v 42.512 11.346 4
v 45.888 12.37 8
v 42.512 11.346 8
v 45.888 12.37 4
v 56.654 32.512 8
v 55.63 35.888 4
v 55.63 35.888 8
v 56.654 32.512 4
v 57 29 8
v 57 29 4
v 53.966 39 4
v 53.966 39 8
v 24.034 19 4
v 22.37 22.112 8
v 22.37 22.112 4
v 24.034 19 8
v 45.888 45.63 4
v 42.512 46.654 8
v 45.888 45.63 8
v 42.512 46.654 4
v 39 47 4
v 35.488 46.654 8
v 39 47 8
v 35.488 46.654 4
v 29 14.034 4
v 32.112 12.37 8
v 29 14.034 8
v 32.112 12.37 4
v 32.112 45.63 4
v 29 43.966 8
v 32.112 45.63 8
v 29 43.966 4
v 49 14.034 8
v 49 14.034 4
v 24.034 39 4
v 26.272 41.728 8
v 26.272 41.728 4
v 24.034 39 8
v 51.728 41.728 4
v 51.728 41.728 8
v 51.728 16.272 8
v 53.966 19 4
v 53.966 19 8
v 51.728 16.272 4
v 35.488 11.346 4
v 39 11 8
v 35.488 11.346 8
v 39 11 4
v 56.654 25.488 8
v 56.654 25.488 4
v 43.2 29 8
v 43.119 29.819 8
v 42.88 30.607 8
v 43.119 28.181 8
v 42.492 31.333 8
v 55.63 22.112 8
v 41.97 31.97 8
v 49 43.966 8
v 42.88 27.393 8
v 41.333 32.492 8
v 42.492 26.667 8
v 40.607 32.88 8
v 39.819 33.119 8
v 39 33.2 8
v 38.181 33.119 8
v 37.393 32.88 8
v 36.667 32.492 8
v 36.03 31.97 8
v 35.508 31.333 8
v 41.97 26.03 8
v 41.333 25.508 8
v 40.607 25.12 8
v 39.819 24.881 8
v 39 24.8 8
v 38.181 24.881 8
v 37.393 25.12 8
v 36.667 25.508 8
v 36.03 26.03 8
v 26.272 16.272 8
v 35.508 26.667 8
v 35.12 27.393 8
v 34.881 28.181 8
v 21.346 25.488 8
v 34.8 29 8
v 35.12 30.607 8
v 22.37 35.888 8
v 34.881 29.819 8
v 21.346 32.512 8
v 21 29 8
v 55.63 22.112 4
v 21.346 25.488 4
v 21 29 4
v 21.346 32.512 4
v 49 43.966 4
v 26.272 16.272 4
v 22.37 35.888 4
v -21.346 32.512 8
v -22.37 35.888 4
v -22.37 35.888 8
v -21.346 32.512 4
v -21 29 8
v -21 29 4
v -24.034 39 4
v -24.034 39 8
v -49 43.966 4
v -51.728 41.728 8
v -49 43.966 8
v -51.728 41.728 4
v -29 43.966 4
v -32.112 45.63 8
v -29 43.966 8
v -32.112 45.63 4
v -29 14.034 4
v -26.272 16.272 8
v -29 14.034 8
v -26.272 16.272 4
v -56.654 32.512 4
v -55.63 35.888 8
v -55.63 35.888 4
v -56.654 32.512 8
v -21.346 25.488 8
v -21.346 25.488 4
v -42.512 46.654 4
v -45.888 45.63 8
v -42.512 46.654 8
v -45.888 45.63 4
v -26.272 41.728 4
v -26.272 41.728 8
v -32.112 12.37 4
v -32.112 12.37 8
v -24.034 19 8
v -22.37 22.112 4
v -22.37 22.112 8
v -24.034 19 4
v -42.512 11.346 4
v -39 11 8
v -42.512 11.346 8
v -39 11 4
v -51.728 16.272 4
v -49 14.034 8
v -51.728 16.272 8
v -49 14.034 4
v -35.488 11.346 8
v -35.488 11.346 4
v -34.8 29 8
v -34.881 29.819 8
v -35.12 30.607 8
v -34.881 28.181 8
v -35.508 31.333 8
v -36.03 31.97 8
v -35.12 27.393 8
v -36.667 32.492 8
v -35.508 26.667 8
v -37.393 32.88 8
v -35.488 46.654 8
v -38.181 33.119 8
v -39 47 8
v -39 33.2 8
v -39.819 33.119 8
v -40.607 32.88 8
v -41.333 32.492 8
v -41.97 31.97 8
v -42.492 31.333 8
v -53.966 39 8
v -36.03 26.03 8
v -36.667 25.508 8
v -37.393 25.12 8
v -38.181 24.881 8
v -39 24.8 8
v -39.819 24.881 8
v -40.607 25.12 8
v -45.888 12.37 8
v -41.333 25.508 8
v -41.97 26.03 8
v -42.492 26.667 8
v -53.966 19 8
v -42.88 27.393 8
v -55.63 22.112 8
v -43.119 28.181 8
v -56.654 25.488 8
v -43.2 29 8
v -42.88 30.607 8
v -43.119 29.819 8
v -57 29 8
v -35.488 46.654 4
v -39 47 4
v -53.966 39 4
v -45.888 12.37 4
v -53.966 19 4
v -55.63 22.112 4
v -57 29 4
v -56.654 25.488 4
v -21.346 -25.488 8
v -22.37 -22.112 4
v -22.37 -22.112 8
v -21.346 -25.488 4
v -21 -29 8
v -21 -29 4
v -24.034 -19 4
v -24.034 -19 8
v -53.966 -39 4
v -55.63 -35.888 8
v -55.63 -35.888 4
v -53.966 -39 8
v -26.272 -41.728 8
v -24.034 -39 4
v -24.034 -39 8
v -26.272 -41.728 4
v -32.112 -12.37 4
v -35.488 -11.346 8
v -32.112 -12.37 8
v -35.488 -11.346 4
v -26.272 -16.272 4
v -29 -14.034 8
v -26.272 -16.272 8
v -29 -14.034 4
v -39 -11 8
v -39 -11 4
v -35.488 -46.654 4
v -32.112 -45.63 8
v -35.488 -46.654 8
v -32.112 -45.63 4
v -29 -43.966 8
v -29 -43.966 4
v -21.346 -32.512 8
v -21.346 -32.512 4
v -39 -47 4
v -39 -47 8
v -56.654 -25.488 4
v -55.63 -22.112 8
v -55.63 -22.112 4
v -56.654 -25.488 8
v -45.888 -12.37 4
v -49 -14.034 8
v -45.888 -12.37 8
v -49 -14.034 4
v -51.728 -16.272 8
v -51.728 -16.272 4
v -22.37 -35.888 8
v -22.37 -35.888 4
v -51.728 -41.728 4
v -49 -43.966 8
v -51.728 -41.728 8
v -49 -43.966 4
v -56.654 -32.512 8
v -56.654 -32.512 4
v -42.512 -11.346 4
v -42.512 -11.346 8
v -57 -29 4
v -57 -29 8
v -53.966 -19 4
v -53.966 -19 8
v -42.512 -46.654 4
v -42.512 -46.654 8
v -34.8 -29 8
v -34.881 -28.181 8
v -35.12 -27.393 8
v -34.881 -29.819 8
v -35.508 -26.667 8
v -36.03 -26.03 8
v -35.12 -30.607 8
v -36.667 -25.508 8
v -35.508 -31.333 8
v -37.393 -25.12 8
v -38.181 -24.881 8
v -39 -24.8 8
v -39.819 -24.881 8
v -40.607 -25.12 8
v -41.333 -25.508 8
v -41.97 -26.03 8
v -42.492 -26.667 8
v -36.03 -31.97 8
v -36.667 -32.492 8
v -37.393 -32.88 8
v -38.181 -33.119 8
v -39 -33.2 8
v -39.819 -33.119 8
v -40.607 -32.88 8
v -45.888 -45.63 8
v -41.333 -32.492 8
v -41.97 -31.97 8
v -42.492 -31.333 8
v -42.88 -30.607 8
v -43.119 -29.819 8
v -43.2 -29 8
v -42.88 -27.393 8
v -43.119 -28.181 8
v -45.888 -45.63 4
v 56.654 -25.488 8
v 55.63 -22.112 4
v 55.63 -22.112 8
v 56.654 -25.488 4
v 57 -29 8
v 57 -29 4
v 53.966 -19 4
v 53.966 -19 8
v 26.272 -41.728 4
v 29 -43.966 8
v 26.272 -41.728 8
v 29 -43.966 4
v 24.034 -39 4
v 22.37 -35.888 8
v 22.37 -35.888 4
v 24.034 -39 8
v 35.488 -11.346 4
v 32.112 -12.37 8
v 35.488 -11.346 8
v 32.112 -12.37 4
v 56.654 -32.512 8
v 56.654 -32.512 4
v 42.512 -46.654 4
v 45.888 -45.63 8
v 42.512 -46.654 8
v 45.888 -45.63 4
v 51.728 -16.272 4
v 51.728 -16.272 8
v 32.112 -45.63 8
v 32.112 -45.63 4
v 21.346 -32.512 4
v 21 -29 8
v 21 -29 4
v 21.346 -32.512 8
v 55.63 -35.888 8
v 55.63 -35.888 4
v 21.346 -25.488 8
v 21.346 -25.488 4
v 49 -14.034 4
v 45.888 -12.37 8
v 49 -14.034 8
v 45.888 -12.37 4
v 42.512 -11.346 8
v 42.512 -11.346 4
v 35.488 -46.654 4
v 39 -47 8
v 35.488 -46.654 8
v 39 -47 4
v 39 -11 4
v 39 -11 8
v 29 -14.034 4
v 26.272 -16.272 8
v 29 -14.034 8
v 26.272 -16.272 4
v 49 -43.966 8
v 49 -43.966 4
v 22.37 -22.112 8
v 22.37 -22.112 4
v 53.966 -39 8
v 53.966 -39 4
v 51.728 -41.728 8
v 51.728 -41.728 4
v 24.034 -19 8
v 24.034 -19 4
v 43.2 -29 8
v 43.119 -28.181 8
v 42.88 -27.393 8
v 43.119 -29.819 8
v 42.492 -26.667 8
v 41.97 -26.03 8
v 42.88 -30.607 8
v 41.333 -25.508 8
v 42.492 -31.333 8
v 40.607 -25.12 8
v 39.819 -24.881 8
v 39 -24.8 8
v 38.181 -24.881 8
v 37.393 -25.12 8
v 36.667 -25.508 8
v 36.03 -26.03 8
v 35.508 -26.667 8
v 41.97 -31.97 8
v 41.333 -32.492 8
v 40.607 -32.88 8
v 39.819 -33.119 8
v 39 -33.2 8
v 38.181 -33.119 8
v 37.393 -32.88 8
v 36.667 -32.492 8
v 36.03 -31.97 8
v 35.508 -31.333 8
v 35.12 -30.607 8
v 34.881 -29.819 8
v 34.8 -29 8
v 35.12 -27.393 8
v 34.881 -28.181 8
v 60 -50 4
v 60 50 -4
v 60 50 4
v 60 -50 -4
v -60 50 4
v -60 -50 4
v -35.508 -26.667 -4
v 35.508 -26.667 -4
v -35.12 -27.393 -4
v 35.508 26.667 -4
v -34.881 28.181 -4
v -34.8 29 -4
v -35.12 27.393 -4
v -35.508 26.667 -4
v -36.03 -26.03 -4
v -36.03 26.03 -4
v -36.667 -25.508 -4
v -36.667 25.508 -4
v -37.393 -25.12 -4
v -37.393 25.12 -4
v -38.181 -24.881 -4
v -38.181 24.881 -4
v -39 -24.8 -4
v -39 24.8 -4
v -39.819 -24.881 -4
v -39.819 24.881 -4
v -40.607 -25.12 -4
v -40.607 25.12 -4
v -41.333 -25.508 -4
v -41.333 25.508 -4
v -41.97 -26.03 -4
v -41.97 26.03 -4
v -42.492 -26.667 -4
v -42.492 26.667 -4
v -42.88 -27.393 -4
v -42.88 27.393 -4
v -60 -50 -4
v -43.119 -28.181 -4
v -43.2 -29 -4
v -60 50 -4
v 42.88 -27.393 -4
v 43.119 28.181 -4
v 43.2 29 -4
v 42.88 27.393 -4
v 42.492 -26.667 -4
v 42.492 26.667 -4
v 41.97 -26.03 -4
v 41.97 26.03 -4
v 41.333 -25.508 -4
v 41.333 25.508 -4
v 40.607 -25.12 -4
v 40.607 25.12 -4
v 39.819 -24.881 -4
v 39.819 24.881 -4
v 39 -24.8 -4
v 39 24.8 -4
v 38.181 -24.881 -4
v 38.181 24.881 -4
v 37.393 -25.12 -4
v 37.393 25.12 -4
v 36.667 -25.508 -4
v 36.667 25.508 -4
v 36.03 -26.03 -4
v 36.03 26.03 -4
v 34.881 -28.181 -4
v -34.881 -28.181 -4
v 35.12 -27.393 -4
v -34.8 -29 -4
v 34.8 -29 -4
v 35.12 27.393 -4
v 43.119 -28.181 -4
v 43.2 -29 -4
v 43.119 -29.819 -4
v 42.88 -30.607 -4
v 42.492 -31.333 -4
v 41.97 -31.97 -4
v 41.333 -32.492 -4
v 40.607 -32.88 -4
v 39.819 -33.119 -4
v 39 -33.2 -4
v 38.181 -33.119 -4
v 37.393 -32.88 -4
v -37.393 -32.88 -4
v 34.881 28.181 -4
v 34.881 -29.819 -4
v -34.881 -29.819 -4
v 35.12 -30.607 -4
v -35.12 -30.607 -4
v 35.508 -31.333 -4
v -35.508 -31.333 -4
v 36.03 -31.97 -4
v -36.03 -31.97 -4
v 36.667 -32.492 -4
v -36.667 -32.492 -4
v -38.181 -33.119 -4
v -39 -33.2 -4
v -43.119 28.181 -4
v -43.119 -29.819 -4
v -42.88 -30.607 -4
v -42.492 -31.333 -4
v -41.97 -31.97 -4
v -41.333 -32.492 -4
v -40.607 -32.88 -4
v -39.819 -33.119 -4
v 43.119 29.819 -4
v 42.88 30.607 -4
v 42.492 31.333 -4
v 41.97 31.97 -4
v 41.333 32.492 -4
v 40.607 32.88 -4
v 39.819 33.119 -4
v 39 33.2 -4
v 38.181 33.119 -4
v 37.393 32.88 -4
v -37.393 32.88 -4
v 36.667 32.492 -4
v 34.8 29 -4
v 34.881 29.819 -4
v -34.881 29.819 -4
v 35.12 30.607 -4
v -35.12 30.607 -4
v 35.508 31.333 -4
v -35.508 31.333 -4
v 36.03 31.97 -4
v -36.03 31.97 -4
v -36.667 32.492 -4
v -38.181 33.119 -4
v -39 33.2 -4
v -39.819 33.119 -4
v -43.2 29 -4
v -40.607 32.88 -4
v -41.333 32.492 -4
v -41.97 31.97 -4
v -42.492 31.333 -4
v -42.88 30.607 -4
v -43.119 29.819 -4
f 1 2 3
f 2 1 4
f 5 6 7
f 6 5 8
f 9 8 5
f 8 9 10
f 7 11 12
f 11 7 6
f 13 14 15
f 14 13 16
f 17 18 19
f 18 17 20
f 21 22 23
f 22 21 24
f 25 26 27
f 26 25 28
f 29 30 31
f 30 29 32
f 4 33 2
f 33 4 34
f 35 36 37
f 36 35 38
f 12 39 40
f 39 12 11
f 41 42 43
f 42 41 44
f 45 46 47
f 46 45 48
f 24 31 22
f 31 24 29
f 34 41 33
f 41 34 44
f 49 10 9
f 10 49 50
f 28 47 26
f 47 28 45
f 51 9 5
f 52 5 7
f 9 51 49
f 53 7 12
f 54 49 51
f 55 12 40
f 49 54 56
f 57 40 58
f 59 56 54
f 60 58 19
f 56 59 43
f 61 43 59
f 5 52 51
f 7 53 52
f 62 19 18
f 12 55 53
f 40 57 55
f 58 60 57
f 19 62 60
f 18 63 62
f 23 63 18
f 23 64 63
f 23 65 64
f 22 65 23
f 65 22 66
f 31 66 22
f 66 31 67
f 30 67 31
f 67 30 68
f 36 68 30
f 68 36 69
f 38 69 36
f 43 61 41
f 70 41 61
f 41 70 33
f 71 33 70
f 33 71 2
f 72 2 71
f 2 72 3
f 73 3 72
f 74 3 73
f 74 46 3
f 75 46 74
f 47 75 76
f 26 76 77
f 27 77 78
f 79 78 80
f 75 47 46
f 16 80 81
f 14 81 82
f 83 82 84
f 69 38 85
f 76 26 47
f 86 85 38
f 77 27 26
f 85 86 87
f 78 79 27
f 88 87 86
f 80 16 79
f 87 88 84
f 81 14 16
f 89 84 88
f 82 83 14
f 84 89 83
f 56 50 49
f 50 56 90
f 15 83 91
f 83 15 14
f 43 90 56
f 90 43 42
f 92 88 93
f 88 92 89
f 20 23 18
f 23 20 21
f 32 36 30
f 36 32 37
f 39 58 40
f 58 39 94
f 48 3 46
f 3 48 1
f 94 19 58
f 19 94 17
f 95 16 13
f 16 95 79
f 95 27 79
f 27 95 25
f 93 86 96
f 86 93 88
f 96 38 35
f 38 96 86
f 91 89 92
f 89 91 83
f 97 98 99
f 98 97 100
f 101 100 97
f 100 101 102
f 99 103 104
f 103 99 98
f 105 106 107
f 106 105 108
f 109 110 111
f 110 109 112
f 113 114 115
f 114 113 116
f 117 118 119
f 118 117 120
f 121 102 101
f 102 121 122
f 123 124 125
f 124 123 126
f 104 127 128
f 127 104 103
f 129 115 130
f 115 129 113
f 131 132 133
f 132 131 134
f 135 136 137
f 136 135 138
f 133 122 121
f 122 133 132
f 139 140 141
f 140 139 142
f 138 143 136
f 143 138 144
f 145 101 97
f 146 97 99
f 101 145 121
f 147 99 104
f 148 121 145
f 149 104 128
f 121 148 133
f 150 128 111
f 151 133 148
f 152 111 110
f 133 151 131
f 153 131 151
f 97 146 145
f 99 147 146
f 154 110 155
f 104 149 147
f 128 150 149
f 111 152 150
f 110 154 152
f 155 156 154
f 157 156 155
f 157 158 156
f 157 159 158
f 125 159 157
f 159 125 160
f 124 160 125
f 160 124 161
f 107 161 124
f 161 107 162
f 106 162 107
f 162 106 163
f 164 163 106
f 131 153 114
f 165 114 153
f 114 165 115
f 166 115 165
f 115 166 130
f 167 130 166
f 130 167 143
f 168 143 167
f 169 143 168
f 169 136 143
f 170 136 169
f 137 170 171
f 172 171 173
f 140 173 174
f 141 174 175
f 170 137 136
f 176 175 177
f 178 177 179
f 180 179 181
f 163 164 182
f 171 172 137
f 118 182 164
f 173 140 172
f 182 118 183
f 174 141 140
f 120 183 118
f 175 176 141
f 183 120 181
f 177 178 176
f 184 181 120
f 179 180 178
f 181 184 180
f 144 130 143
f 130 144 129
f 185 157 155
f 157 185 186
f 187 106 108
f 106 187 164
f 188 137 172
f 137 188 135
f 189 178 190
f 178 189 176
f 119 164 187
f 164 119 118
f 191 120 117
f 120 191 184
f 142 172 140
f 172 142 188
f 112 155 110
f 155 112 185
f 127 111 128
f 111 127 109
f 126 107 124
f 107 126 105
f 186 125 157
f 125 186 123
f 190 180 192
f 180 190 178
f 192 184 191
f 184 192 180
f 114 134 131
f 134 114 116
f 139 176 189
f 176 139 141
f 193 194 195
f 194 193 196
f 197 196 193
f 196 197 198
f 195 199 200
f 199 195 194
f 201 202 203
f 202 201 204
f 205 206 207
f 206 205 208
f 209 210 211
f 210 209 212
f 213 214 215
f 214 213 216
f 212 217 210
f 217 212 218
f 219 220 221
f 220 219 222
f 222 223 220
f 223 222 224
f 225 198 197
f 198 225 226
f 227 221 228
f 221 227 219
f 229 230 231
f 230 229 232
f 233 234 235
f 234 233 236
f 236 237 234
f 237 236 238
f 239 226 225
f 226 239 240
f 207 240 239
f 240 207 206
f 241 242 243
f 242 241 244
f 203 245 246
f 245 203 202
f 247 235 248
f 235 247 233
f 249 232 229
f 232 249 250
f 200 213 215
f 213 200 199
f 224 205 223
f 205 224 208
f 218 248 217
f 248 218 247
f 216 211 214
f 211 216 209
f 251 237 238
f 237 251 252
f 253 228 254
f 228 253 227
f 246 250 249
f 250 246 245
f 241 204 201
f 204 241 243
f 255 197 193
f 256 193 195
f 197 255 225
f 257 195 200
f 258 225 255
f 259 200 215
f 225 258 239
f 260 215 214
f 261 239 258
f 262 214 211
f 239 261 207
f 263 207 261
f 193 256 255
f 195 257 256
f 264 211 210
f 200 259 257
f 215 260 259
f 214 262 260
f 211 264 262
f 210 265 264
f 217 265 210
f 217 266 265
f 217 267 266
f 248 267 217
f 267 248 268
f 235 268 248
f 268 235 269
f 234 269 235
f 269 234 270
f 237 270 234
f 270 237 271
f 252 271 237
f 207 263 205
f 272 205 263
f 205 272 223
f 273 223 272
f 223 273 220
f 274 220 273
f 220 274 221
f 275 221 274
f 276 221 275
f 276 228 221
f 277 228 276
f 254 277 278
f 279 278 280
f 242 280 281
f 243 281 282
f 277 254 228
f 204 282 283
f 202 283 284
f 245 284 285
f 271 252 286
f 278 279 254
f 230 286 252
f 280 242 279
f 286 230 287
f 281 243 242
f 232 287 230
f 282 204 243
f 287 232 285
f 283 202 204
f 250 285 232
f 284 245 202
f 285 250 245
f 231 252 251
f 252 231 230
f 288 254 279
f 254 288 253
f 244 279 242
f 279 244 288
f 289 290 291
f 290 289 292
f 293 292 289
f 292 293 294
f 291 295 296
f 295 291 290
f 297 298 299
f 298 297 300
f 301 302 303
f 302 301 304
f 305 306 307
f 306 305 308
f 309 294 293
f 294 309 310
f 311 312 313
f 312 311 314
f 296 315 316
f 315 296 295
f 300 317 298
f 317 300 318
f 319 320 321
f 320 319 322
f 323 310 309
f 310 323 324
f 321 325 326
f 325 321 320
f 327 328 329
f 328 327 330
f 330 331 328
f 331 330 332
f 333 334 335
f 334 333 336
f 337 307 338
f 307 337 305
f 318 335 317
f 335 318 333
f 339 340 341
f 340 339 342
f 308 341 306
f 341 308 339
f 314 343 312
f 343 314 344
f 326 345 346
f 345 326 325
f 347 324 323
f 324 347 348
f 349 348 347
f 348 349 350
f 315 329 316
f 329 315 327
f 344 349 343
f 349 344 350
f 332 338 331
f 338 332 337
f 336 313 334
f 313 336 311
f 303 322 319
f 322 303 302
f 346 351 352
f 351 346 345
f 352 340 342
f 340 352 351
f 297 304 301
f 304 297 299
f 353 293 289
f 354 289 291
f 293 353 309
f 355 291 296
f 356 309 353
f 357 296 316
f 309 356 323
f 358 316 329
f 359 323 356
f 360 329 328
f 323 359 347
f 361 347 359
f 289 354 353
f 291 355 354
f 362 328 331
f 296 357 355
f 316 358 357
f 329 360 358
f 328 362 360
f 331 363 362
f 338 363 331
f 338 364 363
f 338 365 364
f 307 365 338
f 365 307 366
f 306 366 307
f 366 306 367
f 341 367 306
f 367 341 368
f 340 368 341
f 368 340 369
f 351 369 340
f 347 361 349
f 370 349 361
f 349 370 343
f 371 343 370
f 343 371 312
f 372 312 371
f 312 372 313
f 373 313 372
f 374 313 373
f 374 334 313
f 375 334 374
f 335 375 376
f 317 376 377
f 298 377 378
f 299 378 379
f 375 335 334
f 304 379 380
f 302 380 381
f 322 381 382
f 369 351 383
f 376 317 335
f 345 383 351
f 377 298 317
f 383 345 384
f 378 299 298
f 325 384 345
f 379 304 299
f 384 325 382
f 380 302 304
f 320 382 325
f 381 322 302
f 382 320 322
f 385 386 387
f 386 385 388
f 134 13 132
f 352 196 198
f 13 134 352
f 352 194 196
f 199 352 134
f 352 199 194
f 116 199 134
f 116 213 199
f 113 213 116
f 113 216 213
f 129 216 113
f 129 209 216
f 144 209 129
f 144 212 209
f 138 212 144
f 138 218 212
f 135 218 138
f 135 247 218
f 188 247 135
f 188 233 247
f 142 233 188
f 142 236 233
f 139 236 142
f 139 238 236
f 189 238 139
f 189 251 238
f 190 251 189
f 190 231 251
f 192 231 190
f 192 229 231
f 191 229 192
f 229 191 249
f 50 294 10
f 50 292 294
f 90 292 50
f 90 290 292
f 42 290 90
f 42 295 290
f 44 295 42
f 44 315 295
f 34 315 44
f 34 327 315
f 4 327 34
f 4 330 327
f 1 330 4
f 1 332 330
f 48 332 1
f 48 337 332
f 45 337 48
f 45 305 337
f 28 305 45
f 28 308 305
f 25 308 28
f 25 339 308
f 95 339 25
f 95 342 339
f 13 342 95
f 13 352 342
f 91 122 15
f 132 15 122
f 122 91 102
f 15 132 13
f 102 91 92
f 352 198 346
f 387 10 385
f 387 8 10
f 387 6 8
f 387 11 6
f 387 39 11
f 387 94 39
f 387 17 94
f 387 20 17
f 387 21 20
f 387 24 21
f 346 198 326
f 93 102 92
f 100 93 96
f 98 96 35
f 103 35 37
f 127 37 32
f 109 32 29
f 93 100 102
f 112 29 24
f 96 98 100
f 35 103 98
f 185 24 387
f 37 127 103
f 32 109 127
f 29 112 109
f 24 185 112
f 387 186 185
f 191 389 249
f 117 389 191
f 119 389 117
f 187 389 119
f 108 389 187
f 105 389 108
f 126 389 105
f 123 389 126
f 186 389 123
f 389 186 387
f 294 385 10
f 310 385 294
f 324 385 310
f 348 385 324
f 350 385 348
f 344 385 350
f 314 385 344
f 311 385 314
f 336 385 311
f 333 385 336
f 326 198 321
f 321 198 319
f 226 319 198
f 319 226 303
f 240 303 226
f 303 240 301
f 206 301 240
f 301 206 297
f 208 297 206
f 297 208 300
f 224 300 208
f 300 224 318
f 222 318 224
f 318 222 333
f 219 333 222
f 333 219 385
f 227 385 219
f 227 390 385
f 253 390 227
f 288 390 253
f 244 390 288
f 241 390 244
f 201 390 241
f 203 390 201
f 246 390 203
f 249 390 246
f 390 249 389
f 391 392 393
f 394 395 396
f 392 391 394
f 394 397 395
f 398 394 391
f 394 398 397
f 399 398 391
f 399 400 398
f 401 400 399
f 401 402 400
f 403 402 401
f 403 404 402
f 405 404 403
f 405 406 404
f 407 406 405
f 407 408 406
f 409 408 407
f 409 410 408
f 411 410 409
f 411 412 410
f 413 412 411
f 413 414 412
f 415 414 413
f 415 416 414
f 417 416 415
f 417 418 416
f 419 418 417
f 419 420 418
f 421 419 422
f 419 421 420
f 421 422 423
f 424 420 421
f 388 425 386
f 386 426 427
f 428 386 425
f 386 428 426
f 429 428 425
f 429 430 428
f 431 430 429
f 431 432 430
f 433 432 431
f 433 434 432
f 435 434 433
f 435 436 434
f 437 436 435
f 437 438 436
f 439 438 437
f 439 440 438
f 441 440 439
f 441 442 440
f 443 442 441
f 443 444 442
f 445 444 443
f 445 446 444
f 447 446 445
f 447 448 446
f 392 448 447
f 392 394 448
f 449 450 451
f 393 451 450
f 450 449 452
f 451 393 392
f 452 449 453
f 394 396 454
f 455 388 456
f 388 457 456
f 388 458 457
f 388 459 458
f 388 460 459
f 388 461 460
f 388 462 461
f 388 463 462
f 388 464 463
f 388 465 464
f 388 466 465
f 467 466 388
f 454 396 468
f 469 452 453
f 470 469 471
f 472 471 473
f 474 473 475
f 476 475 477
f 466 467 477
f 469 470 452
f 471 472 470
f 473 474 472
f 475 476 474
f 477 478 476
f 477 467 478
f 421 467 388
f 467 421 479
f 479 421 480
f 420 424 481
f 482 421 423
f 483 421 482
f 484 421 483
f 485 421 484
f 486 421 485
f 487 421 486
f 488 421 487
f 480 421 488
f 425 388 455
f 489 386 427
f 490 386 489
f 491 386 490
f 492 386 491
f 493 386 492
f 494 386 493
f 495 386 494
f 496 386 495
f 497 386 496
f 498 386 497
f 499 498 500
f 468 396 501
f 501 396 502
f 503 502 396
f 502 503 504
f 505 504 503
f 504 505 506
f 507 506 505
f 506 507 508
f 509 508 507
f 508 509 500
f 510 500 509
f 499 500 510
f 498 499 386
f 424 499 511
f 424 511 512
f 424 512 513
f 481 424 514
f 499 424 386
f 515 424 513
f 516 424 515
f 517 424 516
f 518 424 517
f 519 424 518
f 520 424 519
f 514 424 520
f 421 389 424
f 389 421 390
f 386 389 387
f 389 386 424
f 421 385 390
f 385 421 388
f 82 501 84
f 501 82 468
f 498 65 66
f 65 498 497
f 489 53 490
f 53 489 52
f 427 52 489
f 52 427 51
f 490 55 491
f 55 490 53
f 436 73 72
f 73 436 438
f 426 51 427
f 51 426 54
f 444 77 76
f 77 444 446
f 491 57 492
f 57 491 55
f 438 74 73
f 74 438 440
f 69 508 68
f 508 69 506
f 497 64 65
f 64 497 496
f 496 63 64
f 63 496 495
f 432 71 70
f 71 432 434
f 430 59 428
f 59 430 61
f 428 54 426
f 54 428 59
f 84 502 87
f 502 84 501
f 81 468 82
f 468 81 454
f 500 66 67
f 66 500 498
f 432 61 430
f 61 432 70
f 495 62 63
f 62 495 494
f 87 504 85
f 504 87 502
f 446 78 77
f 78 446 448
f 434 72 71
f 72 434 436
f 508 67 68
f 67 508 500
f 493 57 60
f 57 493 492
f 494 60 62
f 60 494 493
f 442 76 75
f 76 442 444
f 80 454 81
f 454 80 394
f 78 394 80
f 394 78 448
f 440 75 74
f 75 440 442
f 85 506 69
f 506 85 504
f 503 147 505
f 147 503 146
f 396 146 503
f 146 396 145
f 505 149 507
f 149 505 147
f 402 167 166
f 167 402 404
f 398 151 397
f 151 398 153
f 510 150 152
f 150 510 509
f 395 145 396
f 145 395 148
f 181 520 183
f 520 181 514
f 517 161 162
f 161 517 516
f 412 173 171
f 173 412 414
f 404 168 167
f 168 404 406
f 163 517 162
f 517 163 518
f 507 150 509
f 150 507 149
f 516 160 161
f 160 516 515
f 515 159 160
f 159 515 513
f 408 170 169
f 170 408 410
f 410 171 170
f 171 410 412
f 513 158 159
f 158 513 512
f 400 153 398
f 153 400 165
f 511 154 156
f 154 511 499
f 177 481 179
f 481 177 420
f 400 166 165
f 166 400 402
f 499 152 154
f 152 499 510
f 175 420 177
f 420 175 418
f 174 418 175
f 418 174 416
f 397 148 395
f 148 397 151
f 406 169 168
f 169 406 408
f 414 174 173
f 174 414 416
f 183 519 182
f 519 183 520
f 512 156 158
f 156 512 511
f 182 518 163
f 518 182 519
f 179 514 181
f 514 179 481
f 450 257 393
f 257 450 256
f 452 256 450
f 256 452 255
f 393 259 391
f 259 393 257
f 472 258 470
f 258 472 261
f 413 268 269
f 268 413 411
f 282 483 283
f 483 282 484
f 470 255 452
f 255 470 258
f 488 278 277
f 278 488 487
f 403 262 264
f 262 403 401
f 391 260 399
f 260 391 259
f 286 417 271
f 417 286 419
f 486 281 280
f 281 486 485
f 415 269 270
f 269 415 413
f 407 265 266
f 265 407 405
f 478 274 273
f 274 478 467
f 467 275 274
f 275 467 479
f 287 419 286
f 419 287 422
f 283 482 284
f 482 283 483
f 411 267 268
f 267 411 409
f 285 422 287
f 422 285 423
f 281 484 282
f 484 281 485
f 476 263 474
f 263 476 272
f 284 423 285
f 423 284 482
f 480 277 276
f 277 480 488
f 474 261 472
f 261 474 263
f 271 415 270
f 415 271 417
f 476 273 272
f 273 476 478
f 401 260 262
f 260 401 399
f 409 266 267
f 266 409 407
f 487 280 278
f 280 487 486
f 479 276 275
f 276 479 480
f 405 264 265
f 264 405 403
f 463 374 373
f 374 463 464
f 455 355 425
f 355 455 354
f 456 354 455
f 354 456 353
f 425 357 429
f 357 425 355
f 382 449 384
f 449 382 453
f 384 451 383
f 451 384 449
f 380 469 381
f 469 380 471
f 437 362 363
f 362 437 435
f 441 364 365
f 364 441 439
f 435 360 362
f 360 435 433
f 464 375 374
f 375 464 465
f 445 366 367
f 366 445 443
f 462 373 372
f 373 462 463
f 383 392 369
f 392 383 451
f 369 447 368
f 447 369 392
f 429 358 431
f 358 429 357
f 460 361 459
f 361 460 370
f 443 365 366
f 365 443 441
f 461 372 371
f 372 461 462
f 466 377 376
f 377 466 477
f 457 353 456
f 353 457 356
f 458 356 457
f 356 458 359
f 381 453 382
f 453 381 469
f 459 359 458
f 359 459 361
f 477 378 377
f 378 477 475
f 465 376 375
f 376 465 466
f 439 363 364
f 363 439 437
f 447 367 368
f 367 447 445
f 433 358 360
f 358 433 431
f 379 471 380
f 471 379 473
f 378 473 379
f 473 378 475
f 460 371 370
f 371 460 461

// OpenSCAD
$fn = 32;

// ----------------------------------------------------------------------
// Anchor pads 120 x 100 x 12
// four corner bosses with anchor holes
// ----------------------------------------------------------------------

// --- parameters (mm) ---
plate = [120, 100, 8];  // base plate size (x, y, z)
pads = 4;               // boss count, one per corner
edge = 21;              // boss centre offset from the plate edge
boss_d = 36;            // boss diameter
boss_h = 4;             // boss height above the base plate
hole_d = 8.4;           // hole diameter

// --- derived feature positions (mm) ---
height = plate[2] + boss_h;      // = 12   overall height of the part
corner_x = plate[0] / 2 - edge;  // = 39   boss centre X
corner_y = plate[1] / 2 - edge;  // = 29   boss centre Y
feature_centers = [
  [corner_x, corner_y],
  [-corner_x, corner_y],
  [-corner_x, -corner_y],
  [corner_x, -corner_y]
];   // boss centres, anchor holes are drilled there

// base plate, four bosses standing on it, anchor holes all the way through
difference() {
  union() {
    cube(plate, center = true);
    for (centre = feature_centers)
      translate([centre[0], centre[1], plate[2] / 2 - 1])
        cylinder(d = boss_d, h = boss_h + 1);
  }
  for (centre = feature_centers)
    translate([centre[0], centre[1], -height])
      cylinder(d = hole_d, h = 2 * height + 2);  // through boss and plate
}
